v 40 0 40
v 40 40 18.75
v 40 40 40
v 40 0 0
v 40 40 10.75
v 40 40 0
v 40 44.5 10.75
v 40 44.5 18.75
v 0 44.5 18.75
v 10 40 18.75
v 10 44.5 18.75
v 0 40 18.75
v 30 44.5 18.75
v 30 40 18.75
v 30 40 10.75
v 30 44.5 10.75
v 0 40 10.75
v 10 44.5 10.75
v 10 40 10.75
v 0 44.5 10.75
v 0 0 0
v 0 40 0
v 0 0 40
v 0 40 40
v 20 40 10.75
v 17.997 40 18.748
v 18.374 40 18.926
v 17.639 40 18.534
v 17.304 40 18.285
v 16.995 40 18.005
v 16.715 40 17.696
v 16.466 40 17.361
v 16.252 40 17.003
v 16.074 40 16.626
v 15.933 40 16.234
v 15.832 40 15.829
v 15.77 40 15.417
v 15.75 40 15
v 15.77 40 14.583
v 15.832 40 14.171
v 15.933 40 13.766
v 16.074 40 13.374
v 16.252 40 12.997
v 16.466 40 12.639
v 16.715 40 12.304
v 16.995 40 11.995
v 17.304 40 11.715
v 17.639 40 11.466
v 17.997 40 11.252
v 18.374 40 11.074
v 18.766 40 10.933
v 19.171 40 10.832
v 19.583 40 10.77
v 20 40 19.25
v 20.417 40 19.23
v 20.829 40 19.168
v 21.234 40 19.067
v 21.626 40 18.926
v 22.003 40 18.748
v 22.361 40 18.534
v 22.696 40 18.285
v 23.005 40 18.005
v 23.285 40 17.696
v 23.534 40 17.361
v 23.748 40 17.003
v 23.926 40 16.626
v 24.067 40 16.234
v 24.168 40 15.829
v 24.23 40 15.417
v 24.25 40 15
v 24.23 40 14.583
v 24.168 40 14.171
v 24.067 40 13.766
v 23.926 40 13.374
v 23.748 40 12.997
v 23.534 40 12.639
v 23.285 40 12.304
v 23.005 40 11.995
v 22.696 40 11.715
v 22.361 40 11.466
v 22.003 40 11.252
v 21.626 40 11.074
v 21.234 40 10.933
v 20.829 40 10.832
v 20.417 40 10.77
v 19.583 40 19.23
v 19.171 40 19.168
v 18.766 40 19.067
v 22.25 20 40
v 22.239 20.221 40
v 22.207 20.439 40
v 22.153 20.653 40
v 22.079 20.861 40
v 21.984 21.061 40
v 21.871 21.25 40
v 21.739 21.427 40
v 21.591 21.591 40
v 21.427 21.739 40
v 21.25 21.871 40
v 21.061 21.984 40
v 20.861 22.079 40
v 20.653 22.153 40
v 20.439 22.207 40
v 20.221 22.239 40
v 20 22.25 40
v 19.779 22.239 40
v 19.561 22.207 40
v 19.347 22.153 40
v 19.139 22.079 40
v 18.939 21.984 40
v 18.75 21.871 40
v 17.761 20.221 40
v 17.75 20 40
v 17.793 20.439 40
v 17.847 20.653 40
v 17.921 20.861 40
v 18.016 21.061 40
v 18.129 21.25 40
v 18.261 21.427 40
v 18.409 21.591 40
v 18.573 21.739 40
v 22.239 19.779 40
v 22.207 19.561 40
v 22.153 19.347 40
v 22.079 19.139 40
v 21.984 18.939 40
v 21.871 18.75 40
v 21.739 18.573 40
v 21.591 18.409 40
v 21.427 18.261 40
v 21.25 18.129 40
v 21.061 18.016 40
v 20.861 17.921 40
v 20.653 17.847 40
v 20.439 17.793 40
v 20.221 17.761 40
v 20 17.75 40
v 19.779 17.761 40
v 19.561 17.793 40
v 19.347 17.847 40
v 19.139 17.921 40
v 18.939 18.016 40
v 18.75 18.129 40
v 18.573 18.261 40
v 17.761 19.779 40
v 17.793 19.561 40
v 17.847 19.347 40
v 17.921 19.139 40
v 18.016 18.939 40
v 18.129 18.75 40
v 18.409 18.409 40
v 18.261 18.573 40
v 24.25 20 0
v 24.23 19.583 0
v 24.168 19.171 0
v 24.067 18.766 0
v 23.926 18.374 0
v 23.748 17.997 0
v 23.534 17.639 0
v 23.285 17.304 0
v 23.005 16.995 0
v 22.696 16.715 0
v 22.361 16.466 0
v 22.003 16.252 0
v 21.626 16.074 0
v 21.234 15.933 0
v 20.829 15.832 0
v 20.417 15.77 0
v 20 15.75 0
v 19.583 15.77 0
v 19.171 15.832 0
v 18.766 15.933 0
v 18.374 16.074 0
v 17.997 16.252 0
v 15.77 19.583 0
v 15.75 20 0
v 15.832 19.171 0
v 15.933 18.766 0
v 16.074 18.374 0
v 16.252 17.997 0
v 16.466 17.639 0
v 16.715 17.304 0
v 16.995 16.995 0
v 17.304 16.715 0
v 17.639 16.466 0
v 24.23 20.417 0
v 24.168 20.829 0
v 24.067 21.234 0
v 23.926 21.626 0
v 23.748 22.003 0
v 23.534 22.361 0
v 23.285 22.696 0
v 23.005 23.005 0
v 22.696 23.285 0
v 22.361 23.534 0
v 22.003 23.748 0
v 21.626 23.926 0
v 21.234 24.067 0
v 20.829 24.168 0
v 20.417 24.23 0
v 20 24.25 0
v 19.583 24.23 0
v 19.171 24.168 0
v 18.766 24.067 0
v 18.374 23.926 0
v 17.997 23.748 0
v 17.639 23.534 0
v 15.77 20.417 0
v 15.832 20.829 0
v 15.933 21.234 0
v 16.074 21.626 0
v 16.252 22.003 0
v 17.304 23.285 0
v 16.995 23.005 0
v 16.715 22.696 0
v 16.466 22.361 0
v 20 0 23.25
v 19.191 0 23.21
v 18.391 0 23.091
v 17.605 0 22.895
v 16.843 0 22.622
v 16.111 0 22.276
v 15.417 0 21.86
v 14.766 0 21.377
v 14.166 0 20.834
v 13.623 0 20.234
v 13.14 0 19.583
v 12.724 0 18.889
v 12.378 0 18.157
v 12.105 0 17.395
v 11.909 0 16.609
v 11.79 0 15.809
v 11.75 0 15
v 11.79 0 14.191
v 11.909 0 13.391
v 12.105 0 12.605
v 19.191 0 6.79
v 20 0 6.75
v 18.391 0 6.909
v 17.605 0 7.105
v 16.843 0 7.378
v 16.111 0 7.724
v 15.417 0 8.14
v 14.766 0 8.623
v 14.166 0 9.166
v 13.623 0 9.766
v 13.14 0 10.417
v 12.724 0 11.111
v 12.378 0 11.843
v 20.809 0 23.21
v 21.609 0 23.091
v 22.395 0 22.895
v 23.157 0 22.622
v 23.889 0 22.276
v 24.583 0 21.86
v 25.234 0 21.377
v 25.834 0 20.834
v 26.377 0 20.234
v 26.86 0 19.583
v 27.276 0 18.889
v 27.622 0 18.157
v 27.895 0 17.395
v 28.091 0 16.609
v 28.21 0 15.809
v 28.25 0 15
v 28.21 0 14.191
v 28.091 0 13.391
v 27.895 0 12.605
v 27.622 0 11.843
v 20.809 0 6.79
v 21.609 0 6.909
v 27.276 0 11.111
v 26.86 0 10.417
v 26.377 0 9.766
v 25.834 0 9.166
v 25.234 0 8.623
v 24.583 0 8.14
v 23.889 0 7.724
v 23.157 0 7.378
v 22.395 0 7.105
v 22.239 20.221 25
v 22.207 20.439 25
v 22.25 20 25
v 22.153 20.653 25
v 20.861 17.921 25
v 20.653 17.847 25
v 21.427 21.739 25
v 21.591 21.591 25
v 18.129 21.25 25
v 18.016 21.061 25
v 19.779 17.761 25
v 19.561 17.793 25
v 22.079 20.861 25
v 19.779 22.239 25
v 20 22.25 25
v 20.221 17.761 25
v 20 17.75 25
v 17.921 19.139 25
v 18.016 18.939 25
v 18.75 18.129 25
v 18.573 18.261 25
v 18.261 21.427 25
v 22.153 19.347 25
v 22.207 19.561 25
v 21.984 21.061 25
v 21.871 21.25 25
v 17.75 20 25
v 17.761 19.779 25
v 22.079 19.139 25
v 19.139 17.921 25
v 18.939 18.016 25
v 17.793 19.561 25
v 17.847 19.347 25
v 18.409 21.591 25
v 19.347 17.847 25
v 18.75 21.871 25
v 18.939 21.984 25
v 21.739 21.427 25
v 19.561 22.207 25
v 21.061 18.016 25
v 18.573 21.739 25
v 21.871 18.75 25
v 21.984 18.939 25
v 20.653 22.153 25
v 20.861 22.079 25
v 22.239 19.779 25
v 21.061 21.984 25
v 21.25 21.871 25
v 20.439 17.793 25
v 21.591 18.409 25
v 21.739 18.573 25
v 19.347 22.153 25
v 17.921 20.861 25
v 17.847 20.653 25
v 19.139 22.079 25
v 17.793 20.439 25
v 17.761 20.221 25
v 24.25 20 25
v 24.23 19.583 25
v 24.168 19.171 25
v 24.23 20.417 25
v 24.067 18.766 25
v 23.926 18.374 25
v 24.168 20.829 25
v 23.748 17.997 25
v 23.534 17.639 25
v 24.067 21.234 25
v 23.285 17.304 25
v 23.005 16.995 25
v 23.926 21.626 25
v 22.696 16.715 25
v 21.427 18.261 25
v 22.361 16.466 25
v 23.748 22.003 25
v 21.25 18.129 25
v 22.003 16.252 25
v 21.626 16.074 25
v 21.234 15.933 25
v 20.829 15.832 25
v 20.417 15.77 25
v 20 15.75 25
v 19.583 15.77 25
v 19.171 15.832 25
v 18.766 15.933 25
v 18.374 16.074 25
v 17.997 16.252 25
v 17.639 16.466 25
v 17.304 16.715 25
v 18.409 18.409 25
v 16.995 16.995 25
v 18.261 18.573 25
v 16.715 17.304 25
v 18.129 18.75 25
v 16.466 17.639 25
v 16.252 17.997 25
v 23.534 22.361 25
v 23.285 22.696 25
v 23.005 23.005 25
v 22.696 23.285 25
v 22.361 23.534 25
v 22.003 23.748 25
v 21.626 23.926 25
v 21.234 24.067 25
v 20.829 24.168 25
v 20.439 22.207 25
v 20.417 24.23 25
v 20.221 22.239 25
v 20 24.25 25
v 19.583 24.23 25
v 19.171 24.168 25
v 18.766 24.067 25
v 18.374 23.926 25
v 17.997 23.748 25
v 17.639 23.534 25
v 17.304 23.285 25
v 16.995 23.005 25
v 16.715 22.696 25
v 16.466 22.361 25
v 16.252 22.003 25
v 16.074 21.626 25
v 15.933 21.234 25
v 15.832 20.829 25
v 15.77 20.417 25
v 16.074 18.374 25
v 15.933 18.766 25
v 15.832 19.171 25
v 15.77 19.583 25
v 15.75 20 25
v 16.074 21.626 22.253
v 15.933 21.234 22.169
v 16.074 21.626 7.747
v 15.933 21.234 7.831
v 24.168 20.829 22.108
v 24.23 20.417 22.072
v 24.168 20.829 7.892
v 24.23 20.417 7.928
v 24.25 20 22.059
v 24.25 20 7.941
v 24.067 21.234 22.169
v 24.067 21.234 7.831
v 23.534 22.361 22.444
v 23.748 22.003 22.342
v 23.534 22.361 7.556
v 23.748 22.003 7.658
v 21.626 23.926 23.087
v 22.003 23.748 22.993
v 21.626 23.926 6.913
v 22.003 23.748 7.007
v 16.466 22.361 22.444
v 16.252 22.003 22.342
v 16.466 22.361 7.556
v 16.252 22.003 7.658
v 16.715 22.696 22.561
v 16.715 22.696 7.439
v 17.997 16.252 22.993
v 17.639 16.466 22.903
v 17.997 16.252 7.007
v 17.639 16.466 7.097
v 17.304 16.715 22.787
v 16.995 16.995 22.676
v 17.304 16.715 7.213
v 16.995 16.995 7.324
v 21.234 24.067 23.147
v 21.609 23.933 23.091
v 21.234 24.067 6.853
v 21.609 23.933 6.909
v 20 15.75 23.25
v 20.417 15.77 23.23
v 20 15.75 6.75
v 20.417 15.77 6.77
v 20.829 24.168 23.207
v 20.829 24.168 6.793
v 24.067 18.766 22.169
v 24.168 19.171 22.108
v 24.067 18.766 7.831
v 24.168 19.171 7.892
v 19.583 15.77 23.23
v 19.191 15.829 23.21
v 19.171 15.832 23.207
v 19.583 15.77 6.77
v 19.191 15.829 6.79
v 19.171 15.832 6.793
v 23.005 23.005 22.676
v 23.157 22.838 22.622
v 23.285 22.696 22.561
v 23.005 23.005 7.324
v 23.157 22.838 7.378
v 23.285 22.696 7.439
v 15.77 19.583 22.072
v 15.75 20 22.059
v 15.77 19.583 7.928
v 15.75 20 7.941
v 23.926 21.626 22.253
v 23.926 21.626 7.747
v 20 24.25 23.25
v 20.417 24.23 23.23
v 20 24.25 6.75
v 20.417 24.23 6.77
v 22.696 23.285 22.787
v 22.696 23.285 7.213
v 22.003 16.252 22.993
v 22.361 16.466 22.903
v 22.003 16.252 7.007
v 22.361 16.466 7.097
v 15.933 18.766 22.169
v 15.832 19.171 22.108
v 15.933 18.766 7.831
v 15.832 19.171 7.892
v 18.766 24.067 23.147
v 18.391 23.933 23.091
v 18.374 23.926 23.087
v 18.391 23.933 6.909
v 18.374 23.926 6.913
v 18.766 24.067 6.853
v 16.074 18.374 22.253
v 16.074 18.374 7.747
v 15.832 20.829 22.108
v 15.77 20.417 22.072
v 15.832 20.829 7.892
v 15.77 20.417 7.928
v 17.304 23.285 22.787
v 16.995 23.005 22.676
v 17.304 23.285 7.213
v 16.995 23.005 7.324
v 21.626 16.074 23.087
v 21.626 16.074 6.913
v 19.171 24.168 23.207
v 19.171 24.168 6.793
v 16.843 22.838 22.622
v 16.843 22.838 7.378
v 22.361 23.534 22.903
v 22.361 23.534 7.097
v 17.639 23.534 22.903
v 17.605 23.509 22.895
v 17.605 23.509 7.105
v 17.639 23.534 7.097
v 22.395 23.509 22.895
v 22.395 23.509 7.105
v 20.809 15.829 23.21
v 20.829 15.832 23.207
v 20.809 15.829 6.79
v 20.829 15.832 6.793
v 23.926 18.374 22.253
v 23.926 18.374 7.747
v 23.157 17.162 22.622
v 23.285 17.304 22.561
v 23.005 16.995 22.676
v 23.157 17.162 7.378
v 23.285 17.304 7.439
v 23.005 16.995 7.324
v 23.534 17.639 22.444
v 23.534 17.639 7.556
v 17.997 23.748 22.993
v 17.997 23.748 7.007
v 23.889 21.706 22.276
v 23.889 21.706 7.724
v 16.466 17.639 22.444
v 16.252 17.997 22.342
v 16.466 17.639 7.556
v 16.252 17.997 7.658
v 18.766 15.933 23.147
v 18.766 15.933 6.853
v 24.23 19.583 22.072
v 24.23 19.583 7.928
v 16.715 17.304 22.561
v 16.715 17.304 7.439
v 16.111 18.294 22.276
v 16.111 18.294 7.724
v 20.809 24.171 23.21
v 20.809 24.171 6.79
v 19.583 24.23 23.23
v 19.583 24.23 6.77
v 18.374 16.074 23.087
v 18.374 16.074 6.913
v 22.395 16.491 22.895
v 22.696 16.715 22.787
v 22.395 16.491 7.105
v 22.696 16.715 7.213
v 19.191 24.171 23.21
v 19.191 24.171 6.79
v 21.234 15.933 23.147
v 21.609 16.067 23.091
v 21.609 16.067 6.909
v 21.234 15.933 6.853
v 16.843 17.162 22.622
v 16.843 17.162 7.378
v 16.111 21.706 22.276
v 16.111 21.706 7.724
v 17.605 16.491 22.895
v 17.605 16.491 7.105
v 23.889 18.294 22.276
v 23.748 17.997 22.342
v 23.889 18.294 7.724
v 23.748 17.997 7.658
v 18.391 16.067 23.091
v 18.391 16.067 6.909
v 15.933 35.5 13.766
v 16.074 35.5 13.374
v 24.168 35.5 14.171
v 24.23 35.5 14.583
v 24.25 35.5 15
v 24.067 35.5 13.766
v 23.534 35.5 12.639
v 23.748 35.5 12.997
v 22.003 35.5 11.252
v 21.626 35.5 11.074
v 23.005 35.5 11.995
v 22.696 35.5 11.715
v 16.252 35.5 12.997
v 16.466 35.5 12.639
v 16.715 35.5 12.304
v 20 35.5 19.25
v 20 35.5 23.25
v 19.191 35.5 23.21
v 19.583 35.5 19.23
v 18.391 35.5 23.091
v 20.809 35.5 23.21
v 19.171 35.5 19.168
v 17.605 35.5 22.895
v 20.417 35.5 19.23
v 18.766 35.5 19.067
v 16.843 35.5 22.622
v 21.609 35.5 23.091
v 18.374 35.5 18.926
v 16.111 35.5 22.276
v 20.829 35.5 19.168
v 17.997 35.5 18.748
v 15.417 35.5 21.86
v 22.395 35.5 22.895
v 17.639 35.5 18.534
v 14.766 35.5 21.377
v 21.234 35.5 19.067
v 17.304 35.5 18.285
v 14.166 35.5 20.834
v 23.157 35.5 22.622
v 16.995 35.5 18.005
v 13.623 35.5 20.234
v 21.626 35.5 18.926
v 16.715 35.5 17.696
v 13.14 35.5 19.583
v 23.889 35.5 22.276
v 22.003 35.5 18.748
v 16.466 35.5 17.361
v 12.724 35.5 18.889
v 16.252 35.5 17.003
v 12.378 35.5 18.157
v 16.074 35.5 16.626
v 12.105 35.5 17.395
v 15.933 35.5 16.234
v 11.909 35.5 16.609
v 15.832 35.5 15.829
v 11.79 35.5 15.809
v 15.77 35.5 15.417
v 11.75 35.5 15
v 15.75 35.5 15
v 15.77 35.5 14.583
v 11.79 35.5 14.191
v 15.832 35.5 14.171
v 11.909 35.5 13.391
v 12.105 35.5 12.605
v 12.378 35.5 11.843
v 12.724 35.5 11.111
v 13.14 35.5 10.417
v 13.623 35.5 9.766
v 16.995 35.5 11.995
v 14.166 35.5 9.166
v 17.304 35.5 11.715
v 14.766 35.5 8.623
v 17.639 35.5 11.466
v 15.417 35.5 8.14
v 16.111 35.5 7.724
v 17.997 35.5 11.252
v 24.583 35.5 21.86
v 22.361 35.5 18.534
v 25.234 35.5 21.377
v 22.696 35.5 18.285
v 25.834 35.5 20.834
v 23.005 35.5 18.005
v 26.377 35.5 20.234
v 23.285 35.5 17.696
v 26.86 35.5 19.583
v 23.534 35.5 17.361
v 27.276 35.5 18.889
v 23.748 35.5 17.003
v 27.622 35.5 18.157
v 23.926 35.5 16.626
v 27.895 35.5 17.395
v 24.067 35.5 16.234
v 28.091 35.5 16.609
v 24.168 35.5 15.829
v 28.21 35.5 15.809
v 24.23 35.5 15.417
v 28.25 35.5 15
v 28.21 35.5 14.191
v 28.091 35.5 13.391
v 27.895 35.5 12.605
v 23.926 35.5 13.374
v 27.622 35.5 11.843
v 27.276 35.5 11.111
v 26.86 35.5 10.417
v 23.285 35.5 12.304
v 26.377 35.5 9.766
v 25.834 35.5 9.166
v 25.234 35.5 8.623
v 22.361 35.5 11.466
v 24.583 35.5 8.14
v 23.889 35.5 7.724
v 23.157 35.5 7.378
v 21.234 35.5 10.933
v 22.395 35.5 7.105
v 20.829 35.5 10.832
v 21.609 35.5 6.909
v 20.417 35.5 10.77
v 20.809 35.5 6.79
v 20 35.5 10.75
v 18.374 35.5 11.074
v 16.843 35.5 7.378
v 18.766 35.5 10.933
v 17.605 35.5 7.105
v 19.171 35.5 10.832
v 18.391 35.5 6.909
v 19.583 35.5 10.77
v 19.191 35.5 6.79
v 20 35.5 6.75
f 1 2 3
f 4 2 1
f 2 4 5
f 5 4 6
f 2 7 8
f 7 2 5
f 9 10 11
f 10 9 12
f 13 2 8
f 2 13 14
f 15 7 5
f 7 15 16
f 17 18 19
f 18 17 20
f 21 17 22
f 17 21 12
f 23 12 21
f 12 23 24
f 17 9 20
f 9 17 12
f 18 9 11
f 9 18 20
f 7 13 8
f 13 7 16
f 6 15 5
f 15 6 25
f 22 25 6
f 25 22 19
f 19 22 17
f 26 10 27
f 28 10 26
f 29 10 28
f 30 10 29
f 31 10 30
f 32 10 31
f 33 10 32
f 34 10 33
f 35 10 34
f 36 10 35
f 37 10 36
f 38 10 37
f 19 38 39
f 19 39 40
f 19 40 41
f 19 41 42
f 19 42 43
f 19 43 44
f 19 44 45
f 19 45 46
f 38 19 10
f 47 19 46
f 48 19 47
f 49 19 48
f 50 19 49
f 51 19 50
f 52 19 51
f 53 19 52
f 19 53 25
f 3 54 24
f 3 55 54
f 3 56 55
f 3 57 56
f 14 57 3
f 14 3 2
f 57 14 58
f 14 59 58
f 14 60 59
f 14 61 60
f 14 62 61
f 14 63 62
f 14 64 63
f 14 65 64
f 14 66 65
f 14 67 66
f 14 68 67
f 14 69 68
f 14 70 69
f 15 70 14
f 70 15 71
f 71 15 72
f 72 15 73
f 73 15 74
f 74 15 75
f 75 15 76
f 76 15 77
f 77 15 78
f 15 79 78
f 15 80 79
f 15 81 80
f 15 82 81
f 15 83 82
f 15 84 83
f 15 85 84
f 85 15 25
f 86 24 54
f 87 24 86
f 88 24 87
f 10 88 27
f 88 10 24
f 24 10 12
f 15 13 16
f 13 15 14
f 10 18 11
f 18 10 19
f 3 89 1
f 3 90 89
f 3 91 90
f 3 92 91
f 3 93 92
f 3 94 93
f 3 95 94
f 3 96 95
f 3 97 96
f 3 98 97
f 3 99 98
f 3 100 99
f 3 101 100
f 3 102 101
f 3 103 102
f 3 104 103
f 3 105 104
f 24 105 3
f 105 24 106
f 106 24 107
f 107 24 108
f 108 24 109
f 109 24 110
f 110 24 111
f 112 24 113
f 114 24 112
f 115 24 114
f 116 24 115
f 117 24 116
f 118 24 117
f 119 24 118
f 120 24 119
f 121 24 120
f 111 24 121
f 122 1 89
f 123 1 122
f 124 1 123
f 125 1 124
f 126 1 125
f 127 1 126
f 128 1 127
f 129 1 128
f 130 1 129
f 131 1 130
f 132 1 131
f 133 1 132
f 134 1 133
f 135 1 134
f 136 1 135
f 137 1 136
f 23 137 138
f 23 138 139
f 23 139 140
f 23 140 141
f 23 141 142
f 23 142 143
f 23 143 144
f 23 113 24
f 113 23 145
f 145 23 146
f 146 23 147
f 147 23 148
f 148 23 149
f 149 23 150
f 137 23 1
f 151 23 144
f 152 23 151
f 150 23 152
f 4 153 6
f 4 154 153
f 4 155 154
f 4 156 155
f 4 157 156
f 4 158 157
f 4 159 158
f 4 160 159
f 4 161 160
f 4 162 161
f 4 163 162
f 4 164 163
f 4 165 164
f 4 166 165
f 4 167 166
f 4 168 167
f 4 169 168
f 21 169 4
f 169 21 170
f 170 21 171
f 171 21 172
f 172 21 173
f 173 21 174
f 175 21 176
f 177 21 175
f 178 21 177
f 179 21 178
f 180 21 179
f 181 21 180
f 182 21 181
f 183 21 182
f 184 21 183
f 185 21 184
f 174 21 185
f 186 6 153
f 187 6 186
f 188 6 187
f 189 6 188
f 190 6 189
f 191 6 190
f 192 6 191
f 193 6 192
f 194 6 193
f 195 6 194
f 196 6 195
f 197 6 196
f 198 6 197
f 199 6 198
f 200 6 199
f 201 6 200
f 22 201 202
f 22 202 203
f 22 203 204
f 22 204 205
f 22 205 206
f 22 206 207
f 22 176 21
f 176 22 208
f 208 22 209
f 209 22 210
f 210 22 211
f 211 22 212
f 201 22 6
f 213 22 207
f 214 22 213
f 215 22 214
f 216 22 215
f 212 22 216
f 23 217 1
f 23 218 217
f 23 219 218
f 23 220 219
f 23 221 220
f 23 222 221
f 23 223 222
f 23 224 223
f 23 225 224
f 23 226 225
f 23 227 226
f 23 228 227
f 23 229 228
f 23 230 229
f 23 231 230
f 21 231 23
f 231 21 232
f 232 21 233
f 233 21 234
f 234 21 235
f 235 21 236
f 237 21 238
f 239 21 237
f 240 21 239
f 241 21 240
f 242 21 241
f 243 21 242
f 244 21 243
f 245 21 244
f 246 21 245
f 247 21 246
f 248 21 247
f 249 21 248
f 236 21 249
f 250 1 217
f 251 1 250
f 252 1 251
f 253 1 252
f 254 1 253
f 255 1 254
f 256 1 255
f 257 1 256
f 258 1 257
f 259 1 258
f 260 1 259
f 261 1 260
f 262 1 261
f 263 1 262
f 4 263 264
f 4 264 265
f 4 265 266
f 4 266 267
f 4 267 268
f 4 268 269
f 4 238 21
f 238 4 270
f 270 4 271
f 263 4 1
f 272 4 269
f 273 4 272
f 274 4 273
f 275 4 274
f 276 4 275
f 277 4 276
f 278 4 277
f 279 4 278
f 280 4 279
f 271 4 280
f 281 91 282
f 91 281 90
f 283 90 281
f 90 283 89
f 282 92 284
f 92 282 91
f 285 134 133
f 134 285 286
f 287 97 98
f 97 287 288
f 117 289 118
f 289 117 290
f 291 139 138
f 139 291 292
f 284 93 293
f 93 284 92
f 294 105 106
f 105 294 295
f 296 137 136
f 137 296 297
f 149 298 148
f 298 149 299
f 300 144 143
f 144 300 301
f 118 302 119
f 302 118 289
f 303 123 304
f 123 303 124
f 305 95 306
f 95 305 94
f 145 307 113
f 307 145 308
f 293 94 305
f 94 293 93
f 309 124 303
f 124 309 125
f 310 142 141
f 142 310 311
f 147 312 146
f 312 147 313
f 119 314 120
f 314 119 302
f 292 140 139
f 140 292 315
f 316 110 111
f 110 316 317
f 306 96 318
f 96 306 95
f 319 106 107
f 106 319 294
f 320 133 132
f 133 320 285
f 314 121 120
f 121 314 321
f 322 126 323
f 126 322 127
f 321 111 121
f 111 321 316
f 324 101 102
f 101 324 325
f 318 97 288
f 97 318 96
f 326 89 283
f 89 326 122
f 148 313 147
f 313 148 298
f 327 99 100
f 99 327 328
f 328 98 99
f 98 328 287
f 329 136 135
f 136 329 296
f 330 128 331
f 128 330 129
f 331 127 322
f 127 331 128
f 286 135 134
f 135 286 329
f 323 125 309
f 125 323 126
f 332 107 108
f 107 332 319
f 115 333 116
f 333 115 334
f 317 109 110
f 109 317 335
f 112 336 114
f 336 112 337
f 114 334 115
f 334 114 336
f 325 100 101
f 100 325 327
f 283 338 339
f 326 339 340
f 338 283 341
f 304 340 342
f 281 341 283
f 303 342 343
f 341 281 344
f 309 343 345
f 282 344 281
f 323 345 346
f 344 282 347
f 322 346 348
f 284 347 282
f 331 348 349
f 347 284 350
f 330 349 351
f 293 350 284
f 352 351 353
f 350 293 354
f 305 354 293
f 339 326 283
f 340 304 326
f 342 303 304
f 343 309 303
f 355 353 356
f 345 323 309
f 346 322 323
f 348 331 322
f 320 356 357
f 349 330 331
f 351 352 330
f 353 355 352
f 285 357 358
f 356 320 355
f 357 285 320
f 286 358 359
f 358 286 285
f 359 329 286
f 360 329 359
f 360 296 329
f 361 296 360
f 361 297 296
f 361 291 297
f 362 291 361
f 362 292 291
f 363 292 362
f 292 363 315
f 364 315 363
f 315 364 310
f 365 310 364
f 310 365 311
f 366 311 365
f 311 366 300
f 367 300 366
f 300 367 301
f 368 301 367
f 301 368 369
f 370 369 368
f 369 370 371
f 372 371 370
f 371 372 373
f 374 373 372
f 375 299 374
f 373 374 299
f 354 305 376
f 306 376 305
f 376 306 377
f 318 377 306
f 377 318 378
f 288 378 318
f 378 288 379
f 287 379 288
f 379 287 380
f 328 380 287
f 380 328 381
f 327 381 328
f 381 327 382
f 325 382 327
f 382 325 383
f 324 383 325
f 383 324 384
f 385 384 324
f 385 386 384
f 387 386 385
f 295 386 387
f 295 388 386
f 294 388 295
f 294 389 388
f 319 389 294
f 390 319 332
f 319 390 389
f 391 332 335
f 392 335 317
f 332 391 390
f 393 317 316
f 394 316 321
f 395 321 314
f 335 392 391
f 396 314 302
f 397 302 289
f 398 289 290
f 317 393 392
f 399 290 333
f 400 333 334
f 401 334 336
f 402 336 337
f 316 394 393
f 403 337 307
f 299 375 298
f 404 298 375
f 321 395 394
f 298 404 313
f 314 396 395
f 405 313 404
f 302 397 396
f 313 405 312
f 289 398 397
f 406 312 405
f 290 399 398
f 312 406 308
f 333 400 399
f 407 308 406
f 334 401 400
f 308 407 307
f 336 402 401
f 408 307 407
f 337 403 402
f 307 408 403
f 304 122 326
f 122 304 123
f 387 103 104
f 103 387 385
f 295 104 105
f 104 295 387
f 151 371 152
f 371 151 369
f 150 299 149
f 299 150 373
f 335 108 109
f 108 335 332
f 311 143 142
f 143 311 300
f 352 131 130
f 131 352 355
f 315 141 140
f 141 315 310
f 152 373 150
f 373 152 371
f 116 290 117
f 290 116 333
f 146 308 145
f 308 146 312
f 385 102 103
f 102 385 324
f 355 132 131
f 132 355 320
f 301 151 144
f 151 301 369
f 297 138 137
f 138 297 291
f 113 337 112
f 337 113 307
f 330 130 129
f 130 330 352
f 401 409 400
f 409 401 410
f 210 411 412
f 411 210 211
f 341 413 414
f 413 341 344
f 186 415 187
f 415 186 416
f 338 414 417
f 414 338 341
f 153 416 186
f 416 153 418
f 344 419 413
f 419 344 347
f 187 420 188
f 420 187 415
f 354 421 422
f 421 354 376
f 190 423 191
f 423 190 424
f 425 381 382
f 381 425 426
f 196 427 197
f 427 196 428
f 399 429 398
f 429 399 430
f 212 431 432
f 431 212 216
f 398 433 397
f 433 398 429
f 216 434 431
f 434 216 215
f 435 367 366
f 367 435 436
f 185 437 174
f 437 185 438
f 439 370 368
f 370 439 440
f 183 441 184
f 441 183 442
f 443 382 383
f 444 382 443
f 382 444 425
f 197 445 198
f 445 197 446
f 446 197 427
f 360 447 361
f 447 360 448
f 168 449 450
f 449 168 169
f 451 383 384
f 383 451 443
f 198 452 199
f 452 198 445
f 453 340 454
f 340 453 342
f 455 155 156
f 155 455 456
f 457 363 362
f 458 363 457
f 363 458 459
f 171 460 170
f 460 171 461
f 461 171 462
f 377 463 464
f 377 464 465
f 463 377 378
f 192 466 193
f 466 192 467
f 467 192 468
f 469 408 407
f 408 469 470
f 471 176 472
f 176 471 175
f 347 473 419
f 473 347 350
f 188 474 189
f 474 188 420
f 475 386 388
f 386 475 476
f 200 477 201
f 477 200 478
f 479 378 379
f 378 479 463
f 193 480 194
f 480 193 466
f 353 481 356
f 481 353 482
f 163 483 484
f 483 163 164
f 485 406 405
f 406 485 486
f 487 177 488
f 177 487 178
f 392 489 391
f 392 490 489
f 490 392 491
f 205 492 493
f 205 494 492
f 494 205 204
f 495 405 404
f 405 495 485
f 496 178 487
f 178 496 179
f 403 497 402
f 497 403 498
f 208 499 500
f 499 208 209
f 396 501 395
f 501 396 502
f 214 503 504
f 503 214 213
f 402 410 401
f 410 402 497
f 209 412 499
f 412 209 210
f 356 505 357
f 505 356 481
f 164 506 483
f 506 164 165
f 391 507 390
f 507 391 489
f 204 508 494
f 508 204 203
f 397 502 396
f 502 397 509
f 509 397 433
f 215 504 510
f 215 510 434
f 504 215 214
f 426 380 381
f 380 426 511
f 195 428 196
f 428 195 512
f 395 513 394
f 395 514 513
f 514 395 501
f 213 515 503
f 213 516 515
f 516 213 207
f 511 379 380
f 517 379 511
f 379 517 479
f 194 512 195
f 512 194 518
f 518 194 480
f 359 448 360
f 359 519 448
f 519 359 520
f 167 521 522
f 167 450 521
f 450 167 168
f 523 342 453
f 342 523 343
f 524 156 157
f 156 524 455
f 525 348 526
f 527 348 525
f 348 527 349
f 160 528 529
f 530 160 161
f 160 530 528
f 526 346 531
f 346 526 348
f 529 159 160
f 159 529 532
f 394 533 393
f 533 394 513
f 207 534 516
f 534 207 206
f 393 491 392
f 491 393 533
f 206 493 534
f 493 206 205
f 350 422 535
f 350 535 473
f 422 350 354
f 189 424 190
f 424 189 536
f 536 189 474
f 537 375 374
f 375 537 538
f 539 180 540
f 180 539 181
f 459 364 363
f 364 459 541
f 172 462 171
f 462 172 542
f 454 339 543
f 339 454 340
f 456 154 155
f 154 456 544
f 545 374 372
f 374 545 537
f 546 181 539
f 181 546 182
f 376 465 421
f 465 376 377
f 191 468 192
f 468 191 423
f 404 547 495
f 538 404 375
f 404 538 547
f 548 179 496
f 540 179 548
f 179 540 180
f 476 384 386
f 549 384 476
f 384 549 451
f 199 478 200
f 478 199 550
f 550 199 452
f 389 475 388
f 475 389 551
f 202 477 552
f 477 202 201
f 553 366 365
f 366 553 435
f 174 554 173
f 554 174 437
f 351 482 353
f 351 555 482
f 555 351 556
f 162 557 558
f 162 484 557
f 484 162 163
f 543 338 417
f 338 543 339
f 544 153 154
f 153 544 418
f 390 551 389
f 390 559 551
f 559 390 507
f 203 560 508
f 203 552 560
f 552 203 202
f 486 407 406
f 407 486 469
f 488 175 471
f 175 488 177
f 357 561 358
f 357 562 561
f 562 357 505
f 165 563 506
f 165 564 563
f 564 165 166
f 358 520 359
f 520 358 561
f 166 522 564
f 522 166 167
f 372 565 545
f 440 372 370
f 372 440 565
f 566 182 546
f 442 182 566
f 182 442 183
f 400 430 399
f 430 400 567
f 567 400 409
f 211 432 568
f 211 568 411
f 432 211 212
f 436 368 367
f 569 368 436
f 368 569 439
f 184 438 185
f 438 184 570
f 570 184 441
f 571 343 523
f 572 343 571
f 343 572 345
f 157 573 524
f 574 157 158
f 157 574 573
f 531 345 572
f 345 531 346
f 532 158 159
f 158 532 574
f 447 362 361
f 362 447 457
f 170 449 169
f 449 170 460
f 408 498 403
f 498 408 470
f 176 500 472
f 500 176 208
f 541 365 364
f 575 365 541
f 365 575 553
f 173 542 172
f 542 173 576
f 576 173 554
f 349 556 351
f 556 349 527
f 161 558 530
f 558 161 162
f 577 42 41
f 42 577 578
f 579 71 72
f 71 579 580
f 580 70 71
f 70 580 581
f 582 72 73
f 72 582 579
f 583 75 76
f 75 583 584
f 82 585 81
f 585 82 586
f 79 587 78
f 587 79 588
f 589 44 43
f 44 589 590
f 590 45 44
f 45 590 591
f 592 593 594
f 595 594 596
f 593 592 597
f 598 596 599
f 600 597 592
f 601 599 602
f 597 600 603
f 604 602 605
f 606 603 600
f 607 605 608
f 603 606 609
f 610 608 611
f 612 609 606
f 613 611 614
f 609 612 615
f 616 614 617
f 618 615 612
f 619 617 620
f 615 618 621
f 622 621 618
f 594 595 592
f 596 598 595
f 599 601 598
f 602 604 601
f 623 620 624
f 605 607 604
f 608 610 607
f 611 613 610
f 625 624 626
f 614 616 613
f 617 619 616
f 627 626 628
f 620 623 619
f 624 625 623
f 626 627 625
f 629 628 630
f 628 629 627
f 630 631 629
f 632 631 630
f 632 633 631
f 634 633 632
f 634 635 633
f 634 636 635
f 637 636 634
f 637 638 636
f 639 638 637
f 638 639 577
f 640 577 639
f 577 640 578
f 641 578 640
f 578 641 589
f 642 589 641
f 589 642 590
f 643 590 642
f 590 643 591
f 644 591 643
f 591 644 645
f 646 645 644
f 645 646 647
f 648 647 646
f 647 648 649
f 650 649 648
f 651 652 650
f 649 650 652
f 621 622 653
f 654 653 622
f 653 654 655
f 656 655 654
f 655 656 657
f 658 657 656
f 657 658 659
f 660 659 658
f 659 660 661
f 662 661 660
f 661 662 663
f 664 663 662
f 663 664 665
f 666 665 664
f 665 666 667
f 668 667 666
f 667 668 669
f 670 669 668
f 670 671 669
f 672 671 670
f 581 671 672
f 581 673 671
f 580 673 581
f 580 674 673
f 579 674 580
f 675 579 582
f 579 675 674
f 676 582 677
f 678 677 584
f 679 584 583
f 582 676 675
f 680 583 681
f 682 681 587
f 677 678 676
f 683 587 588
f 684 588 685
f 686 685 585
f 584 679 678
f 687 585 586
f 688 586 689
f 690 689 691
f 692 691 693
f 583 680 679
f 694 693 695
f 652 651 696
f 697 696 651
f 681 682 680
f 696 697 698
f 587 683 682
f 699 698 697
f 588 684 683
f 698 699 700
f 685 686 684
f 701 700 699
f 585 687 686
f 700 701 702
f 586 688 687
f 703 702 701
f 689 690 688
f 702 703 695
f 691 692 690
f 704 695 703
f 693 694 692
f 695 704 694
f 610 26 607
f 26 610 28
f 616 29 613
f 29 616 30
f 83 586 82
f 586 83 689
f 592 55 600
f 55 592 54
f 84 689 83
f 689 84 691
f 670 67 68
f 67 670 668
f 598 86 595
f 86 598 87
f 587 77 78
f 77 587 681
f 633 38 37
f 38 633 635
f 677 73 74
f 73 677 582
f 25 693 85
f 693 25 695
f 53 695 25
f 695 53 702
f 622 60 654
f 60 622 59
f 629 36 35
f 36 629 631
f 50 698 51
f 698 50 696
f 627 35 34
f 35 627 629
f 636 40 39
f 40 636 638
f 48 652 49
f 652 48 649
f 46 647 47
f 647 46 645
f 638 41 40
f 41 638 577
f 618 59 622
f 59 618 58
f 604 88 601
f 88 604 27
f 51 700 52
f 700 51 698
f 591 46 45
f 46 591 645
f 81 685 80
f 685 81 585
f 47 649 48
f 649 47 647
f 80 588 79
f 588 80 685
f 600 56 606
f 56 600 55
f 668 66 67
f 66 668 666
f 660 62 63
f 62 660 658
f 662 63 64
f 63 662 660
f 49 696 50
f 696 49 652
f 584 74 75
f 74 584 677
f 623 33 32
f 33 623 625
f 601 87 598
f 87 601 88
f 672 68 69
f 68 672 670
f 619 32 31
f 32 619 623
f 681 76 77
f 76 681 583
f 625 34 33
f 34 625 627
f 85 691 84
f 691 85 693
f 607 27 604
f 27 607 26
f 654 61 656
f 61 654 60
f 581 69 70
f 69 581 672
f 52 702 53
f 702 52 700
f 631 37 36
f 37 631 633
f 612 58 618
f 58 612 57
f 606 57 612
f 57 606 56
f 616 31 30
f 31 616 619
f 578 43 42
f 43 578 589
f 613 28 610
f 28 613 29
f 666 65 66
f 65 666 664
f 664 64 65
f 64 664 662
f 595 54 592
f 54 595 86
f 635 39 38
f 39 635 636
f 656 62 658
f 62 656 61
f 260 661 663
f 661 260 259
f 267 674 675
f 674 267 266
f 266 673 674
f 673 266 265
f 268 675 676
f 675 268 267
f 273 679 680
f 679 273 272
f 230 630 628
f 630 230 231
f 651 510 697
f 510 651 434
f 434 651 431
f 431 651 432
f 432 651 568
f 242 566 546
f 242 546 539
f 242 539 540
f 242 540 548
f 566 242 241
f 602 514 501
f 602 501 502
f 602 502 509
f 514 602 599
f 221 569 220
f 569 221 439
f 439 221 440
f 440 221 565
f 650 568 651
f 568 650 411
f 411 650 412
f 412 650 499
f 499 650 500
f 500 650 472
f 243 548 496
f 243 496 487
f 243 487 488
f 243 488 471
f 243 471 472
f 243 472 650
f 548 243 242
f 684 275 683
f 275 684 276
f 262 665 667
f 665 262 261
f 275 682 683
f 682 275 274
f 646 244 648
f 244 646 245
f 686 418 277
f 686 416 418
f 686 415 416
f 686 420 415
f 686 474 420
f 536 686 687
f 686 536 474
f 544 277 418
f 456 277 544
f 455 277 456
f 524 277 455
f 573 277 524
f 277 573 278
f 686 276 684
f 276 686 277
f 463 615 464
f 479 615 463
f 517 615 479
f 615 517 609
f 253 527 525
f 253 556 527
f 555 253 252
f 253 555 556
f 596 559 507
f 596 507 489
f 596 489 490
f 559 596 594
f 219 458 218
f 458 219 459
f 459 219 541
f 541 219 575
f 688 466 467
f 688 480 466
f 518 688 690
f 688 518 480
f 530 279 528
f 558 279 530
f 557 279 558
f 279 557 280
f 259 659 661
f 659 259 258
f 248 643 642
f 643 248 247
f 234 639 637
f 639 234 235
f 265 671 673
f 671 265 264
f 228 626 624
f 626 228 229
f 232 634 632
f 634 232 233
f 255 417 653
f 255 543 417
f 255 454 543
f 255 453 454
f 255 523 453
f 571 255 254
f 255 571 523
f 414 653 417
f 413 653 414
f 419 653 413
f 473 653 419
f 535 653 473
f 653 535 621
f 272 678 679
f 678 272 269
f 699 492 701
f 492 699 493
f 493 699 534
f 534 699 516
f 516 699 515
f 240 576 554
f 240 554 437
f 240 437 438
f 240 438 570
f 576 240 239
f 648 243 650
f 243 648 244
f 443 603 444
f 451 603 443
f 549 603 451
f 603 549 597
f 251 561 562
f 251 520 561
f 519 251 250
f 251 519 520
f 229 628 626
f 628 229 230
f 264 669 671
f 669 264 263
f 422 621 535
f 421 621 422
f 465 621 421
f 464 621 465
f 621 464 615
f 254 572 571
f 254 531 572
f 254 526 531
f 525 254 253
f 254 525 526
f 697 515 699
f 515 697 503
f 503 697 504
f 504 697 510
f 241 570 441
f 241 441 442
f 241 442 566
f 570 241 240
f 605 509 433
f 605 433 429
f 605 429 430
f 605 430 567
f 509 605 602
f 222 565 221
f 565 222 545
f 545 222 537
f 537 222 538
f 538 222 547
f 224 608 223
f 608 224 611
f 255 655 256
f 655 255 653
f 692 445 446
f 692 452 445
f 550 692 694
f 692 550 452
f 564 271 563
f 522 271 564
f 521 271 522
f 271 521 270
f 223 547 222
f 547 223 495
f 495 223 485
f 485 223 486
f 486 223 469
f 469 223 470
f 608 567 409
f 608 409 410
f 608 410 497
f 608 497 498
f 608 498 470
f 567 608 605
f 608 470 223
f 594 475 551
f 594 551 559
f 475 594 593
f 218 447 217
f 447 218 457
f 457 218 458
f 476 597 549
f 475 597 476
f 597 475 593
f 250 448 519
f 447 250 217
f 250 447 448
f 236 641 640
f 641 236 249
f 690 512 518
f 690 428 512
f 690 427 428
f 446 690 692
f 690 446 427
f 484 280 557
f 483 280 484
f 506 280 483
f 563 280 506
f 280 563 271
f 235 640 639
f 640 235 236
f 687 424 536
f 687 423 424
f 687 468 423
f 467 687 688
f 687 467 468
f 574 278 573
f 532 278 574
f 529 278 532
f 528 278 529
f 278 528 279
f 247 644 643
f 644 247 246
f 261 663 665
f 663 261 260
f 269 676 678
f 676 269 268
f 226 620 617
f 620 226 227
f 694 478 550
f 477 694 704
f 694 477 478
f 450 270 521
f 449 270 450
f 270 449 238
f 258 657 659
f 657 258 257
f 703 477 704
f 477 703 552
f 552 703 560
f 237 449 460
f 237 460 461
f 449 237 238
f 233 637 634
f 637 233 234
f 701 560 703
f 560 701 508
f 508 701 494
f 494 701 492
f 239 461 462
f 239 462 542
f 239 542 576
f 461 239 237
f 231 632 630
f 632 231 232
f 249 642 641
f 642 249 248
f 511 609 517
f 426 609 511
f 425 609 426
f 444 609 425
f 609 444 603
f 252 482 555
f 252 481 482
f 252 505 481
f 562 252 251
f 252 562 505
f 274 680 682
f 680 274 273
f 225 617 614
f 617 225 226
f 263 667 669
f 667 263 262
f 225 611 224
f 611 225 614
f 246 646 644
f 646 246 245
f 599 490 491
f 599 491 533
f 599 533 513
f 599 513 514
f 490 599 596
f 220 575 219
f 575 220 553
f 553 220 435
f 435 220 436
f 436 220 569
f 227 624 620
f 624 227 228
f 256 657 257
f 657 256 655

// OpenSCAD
// Wandhalter für ein 4040 Aluprofil
$fn=64;
alu = [40, 8, 4.5];
wall_screw = [8.5, 4.5, 15];
alu_screw = [16.5, 8.5, 4.5];
insert_z = 20;
alu_screw_dz = 5;

difference(){
	union(){
		// base: cube
		cube([alu.x, alu.x, alu.x]);

		// base: holds alu insert in place
		translate([0, alu.x, alu.x/2 - alu_screw_dz - alu_screw.y/2]) difference(){
			cube([alu.x, alu.z, alu.y]);
			translate([alu.x/2-insert_z/2, 0, 0]) cube([insert_z, alu.z, alu.y]);
		}
	}

	// wall screw
	translate([alu.x/2, alu.x/2, alu.x-wall_screw.z]) union(){
		cylinder(d=wall_screw.y, h=wall_screw.z);
		translate([0, 0, -alu.x]) cylinder(d=wall_screw.x, h=alu.x);
	}

	// alu screw
	translate([alu.x/2, alu.x-alu_screw.z, alu.x/2-alu_screw_dz]) rotate([-90, 0, 0]) union(){
		cylinder(d=alu_screw.y, h=alu_screw.z);
		translate([0, 0, -alu.x]) cylinder(d=alu_screw.x, h=alu.x);
	}
}
